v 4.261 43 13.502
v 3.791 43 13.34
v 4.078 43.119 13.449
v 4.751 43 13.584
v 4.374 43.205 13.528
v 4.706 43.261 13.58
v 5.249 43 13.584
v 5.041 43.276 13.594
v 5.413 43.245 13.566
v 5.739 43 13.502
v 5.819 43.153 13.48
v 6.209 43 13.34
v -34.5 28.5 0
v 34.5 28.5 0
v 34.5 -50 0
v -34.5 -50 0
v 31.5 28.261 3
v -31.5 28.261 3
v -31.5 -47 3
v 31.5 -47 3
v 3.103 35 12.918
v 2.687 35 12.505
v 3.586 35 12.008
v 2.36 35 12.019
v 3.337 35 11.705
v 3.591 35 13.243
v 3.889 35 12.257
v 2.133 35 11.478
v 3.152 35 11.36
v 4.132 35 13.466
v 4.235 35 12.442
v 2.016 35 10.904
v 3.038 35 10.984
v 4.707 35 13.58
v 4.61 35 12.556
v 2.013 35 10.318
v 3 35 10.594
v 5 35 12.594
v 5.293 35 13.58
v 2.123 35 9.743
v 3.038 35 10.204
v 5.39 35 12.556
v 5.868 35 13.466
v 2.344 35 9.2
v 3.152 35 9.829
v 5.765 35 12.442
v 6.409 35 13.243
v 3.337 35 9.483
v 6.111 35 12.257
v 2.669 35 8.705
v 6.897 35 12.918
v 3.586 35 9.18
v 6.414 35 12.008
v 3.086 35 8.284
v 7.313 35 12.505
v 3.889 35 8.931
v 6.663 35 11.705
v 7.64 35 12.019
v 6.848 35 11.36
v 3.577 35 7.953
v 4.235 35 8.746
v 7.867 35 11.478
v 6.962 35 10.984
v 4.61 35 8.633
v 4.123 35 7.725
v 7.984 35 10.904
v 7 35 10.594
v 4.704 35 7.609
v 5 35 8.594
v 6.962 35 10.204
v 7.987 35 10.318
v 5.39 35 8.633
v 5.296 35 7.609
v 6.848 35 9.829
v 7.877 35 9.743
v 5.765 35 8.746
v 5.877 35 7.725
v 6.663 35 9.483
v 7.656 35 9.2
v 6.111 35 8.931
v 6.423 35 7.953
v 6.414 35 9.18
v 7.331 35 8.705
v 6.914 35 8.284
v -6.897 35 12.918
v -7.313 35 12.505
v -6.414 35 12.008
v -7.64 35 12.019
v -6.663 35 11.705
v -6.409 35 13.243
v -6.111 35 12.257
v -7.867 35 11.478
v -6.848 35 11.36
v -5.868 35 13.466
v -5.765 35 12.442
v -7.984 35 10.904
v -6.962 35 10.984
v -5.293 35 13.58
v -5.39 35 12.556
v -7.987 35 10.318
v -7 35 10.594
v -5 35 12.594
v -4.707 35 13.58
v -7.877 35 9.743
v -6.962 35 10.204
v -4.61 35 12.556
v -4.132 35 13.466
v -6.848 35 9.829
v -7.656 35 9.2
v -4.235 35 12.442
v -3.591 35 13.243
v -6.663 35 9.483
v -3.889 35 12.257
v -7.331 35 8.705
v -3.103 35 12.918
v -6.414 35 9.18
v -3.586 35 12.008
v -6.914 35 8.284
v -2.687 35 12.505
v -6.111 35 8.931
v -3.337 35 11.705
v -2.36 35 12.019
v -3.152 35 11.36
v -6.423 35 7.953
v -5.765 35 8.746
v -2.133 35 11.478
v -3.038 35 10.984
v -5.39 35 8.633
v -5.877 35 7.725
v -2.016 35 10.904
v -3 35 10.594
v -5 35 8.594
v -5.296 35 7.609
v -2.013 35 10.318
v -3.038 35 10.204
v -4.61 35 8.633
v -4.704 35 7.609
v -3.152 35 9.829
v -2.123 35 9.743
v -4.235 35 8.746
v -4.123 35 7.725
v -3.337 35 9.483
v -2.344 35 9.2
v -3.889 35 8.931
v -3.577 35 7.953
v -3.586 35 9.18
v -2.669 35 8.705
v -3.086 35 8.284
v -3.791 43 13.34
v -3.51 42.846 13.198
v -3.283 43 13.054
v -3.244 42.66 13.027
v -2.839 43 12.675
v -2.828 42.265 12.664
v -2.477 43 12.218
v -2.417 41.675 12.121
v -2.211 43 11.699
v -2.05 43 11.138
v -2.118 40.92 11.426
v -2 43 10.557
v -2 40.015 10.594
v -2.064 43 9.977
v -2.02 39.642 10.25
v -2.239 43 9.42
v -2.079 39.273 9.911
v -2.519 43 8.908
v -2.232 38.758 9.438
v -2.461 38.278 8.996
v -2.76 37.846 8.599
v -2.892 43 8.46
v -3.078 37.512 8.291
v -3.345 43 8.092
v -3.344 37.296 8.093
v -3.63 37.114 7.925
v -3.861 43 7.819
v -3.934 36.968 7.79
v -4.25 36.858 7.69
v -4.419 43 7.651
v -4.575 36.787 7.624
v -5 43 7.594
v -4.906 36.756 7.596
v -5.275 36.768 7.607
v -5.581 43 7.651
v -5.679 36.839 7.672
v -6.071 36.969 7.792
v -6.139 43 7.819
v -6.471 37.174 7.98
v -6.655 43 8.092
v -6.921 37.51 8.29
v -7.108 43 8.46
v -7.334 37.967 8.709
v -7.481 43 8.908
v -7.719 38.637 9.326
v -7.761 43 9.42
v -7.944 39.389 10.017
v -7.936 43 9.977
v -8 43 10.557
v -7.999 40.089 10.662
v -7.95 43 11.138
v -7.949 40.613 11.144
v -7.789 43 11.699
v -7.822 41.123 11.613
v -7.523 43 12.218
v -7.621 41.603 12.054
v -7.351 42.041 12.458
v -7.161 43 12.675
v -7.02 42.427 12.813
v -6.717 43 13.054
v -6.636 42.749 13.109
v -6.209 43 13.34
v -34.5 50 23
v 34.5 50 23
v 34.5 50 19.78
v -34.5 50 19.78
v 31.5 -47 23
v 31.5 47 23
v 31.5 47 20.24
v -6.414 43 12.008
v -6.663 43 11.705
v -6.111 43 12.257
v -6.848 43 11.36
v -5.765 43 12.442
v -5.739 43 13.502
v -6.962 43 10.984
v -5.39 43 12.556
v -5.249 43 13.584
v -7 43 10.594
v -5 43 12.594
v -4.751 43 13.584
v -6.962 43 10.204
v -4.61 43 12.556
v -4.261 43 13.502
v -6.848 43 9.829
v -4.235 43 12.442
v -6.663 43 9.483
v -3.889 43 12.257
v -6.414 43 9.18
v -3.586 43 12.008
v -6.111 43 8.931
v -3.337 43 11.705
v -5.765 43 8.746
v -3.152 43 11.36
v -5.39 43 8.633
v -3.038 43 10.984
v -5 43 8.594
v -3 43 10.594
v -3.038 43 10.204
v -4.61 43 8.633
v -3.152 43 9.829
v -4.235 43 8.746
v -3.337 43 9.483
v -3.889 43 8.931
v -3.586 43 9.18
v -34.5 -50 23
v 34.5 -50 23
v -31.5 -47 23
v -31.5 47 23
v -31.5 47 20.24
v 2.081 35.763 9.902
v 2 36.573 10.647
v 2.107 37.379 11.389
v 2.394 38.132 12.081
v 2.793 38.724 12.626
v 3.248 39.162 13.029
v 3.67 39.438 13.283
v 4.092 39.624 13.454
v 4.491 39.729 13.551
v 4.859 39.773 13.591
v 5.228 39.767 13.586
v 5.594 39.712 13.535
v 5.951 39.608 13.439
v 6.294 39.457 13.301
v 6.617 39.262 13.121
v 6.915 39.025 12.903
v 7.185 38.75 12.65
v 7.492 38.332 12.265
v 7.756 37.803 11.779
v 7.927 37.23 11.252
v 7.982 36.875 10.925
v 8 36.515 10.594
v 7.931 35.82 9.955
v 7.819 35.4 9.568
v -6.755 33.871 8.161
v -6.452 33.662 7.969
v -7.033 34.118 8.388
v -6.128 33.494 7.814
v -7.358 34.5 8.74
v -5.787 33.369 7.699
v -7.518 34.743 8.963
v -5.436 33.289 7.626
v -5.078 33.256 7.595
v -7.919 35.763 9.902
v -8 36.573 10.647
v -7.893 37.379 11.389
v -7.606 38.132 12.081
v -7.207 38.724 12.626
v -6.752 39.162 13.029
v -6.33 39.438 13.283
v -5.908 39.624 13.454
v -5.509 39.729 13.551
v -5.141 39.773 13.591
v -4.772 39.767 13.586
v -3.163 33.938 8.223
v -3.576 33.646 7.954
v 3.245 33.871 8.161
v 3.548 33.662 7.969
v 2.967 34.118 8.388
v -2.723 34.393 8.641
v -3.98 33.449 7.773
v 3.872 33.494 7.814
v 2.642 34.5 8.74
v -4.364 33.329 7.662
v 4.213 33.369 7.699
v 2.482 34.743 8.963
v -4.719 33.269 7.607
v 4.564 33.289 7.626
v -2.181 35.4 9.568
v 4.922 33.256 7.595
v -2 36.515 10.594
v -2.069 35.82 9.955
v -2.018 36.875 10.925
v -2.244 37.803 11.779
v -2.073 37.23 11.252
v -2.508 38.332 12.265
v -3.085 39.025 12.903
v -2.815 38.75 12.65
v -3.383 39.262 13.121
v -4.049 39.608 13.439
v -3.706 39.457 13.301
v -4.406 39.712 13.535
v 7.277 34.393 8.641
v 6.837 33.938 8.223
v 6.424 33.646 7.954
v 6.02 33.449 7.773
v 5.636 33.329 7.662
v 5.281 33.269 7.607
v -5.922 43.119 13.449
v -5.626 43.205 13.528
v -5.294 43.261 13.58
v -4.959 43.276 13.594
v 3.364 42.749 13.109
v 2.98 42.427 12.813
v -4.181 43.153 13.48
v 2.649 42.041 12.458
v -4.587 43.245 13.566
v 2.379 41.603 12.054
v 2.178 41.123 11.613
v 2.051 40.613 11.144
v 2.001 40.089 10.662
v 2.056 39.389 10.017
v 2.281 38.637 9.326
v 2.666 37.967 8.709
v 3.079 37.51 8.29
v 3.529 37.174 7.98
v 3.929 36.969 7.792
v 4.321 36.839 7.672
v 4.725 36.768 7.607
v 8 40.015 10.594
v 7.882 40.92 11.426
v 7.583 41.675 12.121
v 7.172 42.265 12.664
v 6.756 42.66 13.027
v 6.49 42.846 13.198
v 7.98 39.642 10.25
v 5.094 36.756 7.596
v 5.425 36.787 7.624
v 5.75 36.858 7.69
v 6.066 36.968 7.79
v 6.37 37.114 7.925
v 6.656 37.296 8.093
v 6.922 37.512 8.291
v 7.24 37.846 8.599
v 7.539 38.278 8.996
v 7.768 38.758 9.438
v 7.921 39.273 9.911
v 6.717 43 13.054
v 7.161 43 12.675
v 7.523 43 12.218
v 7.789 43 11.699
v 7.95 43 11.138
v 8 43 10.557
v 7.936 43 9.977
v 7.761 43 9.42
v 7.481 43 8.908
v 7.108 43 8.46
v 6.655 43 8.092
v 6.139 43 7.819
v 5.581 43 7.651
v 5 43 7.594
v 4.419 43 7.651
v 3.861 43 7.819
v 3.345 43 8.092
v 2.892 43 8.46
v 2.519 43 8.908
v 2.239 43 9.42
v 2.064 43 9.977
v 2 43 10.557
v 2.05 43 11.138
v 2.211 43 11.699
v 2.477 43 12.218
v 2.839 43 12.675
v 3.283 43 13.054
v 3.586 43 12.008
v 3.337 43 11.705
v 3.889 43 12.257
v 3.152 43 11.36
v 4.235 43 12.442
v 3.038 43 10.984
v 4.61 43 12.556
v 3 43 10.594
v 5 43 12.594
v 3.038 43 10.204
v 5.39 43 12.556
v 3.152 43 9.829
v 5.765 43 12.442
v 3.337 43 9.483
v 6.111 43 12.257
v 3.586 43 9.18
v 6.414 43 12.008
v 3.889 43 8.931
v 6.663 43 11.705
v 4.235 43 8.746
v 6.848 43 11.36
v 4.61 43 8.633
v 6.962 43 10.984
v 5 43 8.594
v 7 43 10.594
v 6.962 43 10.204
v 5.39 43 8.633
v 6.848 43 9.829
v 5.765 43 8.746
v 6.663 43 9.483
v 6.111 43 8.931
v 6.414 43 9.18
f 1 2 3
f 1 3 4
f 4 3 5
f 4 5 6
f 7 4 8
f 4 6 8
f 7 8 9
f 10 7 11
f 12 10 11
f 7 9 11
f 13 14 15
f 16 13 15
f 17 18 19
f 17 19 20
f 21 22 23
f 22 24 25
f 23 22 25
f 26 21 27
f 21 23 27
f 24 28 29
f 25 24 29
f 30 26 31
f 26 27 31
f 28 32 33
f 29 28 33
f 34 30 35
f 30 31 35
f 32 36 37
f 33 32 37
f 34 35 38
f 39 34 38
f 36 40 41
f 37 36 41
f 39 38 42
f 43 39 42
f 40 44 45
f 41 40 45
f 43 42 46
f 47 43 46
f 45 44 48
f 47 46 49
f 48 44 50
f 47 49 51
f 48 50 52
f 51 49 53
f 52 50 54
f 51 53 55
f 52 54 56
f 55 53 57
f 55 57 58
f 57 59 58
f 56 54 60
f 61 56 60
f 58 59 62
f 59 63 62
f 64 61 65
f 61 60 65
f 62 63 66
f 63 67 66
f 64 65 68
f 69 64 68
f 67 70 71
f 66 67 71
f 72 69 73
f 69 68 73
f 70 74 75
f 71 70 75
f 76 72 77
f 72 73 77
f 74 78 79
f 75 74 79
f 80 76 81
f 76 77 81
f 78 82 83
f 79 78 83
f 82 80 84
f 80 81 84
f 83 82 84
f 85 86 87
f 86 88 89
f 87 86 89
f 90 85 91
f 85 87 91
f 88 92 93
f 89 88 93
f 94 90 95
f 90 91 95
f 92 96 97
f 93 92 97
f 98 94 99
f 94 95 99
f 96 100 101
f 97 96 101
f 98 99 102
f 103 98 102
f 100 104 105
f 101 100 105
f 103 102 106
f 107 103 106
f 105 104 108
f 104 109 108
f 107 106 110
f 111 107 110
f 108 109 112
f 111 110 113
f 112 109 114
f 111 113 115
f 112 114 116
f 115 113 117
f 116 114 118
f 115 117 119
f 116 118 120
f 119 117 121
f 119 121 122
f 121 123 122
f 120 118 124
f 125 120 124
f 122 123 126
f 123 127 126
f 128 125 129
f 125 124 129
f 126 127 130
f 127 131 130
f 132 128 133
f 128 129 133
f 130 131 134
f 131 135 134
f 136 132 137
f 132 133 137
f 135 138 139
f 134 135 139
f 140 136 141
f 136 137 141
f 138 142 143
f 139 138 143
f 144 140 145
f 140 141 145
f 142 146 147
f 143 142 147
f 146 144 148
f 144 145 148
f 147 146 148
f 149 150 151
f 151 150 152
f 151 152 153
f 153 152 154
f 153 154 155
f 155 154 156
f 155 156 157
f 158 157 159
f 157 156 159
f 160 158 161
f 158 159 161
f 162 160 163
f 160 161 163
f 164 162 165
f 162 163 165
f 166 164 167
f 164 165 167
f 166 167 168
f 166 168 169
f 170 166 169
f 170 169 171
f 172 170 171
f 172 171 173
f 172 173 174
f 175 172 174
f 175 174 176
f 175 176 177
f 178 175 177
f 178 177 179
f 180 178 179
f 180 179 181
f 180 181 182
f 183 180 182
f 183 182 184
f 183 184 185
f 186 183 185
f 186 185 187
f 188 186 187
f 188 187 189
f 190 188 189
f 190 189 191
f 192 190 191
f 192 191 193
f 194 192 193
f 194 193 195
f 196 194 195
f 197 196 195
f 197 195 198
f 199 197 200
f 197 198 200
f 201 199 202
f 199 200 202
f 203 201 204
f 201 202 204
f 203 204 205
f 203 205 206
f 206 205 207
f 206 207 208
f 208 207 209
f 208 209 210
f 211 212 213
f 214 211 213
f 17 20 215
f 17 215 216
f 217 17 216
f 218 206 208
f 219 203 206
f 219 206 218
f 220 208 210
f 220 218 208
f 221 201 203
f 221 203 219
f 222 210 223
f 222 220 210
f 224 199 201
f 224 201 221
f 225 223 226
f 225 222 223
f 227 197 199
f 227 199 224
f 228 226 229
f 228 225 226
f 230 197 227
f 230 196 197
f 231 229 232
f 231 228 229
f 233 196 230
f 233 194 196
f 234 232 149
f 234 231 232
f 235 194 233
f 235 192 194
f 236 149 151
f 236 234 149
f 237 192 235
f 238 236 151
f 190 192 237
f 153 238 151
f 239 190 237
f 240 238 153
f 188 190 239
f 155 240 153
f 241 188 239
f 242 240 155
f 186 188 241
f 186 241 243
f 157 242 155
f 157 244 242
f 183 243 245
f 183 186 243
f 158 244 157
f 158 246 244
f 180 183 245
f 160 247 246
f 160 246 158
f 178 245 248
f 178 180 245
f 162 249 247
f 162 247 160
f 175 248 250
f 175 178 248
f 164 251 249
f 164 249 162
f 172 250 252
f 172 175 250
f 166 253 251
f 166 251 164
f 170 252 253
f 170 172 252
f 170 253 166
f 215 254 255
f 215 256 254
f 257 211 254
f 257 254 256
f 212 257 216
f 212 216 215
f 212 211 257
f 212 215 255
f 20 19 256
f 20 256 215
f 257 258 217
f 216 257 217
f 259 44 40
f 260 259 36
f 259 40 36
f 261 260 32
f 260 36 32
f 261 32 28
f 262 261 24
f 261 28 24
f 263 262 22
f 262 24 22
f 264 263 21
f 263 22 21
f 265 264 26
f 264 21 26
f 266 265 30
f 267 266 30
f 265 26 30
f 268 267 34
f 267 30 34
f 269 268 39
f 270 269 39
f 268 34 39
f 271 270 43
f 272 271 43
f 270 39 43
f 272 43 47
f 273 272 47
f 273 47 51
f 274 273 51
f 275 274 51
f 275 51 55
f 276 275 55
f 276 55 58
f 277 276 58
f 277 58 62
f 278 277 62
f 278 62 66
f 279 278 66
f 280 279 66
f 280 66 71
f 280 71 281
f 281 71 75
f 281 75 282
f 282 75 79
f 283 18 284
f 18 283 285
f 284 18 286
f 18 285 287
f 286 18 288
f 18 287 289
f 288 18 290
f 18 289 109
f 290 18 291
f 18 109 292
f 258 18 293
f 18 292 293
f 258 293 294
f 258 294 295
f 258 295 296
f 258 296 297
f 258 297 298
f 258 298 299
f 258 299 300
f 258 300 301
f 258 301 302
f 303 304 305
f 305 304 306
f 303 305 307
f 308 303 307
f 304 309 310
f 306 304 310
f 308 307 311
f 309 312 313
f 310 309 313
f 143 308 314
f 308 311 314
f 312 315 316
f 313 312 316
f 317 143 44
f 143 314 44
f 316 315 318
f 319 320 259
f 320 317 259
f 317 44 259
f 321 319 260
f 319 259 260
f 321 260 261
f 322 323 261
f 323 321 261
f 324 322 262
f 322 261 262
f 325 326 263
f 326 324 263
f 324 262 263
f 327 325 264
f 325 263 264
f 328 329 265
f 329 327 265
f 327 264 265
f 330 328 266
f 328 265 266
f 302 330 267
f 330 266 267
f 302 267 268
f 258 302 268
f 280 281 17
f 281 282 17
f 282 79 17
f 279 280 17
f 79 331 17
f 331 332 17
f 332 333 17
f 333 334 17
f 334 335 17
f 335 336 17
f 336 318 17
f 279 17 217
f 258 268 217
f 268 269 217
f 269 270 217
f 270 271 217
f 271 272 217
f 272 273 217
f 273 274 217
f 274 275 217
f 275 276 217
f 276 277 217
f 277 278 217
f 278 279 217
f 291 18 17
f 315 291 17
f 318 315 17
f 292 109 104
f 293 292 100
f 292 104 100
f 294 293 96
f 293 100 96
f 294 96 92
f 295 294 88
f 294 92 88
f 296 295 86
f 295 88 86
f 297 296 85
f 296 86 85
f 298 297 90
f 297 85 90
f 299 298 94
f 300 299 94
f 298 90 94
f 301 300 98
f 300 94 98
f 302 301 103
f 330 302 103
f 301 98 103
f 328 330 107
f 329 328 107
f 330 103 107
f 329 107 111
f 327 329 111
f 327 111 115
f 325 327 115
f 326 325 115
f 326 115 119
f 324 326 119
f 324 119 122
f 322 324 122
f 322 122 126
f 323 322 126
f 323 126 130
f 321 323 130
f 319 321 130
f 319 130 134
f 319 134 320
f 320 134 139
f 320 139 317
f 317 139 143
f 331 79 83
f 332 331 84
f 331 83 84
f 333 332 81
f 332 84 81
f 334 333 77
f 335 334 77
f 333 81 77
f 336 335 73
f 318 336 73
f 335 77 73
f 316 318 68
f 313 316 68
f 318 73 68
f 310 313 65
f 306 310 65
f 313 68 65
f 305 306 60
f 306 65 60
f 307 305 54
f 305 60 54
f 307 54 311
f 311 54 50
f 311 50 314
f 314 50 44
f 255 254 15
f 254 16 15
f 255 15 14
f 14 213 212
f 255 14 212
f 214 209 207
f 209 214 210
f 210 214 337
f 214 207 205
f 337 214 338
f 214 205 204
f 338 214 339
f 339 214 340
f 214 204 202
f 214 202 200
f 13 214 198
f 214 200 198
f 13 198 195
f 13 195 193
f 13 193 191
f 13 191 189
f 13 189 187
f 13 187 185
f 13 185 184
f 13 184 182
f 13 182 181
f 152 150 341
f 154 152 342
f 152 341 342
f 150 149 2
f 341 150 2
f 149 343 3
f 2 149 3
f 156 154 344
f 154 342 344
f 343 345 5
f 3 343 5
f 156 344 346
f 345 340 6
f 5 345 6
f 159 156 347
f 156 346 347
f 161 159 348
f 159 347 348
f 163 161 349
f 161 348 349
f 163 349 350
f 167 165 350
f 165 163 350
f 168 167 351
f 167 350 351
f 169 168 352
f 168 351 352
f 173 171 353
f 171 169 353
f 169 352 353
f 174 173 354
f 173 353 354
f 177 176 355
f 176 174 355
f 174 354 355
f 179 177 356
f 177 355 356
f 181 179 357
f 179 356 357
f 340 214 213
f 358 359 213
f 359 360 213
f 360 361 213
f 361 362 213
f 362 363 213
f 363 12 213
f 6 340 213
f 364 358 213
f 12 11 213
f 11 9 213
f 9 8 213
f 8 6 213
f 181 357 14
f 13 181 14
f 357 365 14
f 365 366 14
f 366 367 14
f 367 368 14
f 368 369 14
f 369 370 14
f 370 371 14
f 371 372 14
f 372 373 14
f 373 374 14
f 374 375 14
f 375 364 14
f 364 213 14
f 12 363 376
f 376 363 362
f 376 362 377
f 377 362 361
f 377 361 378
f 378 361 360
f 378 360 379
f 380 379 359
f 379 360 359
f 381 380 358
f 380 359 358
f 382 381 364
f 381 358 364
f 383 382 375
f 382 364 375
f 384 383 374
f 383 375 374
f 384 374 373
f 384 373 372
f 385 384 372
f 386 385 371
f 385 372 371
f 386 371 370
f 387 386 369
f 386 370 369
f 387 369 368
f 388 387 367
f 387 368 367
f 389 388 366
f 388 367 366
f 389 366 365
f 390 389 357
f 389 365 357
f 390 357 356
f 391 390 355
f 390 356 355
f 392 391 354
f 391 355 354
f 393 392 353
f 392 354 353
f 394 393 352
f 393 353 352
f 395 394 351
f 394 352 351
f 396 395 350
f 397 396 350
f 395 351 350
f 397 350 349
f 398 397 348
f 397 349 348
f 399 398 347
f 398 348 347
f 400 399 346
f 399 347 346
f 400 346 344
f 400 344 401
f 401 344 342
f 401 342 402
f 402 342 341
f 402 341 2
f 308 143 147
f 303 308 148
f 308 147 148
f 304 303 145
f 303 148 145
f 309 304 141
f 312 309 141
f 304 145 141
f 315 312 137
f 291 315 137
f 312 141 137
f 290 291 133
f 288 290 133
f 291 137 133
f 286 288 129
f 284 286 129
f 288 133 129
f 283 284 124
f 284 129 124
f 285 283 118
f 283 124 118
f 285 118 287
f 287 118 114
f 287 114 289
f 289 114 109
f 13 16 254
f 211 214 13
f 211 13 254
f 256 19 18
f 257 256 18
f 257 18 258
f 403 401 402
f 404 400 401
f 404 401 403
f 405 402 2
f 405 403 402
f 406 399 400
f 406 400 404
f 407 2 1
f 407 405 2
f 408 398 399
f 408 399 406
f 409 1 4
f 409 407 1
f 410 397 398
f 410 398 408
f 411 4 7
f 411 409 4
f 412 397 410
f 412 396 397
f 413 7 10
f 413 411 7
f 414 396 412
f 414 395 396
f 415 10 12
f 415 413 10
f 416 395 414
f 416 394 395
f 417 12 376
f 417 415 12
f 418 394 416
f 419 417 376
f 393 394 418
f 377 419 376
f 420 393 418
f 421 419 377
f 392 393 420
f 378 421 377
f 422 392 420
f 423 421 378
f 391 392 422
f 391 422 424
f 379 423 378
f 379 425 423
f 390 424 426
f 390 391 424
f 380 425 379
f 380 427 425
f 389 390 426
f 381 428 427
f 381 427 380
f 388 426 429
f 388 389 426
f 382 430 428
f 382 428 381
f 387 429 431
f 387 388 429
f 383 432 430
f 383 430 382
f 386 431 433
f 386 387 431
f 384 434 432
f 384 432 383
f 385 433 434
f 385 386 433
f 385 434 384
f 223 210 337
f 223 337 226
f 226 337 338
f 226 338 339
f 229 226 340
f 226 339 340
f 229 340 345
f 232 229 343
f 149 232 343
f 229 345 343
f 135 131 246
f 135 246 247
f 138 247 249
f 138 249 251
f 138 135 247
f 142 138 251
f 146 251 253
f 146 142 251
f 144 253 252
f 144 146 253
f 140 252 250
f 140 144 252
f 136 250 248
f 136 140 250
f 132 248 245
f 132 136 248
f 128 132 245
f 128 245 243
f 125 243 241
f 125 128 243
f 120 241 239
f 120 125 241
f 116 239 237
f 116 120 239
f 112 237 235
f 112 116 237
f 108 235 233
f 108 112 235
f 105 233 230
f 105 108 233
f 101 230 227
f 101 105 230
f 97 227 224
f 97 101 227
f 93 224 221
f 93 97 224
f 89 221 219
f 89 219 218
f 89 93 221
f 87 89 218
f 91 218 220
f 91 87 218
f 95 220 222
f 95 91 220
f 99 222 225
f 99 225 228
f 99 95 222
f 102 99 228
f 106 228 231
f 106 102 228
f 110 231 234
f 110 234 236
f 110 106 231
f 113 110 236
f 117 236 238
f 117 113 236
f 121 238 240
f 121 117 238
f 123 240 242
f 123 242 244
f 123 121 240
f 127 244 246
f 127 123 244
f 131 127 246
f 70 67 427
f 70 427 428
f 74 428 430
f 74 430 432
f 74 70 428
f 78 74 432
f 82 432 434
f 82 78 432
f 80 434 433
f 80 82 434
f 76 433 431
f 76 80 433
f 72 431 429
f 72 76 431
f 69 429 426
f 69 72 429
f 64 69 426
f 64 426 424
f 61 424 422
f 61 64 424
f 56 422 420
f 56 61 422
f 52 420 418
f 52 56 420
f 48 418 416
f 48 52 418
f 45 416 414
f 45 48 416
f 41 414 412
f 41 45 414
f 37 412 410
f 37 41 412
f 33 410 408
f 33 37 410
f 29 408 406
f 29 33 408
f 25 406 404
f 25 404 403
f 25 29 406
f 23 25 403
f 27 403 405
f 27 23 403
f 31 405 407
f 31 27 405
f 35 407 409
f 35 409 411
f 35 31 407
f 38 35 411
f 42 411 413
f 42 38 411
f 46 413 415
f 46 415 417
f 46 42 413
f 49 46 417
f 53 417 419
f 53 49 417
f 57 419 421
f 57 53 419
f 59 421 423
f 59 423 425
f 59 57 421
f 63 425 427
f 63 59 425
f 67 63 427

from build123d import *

# Parameters (mm, degrees)
IZIM1_W                     = 69
IZIM1_H                     = 100
Y_KSEKLIK_EKSTR_ZYON1_DEPTH = 3
IZIM2_W                     = 69
IZIM2_H                     = 100
IZIM2_W_2                   = 63
IZIM2_H_2                   = 94
Y_KSEKLIK_EKSTR_ZYON2_DEPTH = 20
KES_EKSTR_ZYON1_DEPTH       = 70
Y_KSEKLIK_EKSTR_ZYON3_DEPTH = 69
IZIM5_R                     = 3
KES_EKSTR_ZYON2_DEPTH       = 20
Y_KSEKLIK_EKSTR_ZYON4_START = -15
IZIM6_R                     = 3
IZIM6_R_2                   = 2
Y_KSEKLIK_EKSTR_ZYON4_DEPTH = 8


with BuildPart() as part:
    # Çizim1 → Yükseklik-Ekstrüzyon1 (new body)
    with BuildSketch(Plane.XY):
        Rectangle(IZIM1_W, IZIM1_H)
    extrude(amount=Y_KSEKLIK_EKSTR_ZYON1_DEPTH)

    # Çizim2 → Yükseklik-Ekstrüzyon2 (add)
    with BuildSketch(Plane.XY.offset(3)):
        Rectangle(IZIM2_W, IZIM2_H)
        Rectangle(IZIM2_W_2, IZIM2_H_2, mode=Mode.SUBTRACT)
    extrude(amount=Y_KSEKLIK_EKSTR_ZYON2_DEPTH)

    # Çizim3 → Kes-Ekstrüzyon1 (cut, through all)
    with BuildSketch(Plane(origin=(34.5, 0, 0), x_dir=(0, 0, -1), z_dir=(1, 0, 0))):
        Polygon((-23, 50), (0, 25), (0, 50), align=None)
    extrude(amount=-KES_EKSTR_ZYON1_DEPTH, mode=Mode.SUBTRACT)

    # Çizim4 → Yükseklik-Ekstrüzyon3 (add, through all)
    with BuildSketch(Plane(origin=(34.5, 0, 0), x_dir=(0, 0, -1), z_dir=(1, 0, 0))):
        Polygon((-23, 50), (-19.78, 50), (0, 28.5), (0, 25), align=None)
    extrude(amount=-Y_KSEKLIK_EKSTR_ZYON3_DEPTH)

    # Çizim5 → Kes-Ekstrüzyon2 (cut)
    with BuildSketch(Plane(origin=(0, 50, 0), x_dir=(1, 0, 0), z_dir=(0, 1, 0))):
        with Locations((-5, -10.594226135)):
            Circle(IZIM5_R)
        with Locations((5, -10.594226135)):
            Circle(IZIM5_R)
    extrude(amount=-KES_EKSTR_ZYON2_DEPTH, mode=Mode.SUBTRACT)

    # Çizim6 → Yükseklik-Ekstrüzyon4 (add)
    with BuildSketch(Plane(origin=(0, 50, 0), x_dir=(1, 0, 0), z_dir=(0, 1, 0)).offset(Y_KSEKLIK_EKSTR_ZYON4_START)):
        with Locations((-5, -10.594226135)):
            Circle(IZIM6_R)
        with Locations((-5, -10.594226135)):
            Circle(IZIM6_R_2, mode=Mode.SUBTRACT)
        with Locations((5, -10.594226135)):
            Circle(IZIM6_R)
        with Locations((5, -10.594226135)):
            Circle(IZIM6_R_2, mode=Mode.SUBTRACT)
    extrude(amount=Y_KSEKLIK_EKSTR_ZYON4_DEPTH)


solid = part.part
